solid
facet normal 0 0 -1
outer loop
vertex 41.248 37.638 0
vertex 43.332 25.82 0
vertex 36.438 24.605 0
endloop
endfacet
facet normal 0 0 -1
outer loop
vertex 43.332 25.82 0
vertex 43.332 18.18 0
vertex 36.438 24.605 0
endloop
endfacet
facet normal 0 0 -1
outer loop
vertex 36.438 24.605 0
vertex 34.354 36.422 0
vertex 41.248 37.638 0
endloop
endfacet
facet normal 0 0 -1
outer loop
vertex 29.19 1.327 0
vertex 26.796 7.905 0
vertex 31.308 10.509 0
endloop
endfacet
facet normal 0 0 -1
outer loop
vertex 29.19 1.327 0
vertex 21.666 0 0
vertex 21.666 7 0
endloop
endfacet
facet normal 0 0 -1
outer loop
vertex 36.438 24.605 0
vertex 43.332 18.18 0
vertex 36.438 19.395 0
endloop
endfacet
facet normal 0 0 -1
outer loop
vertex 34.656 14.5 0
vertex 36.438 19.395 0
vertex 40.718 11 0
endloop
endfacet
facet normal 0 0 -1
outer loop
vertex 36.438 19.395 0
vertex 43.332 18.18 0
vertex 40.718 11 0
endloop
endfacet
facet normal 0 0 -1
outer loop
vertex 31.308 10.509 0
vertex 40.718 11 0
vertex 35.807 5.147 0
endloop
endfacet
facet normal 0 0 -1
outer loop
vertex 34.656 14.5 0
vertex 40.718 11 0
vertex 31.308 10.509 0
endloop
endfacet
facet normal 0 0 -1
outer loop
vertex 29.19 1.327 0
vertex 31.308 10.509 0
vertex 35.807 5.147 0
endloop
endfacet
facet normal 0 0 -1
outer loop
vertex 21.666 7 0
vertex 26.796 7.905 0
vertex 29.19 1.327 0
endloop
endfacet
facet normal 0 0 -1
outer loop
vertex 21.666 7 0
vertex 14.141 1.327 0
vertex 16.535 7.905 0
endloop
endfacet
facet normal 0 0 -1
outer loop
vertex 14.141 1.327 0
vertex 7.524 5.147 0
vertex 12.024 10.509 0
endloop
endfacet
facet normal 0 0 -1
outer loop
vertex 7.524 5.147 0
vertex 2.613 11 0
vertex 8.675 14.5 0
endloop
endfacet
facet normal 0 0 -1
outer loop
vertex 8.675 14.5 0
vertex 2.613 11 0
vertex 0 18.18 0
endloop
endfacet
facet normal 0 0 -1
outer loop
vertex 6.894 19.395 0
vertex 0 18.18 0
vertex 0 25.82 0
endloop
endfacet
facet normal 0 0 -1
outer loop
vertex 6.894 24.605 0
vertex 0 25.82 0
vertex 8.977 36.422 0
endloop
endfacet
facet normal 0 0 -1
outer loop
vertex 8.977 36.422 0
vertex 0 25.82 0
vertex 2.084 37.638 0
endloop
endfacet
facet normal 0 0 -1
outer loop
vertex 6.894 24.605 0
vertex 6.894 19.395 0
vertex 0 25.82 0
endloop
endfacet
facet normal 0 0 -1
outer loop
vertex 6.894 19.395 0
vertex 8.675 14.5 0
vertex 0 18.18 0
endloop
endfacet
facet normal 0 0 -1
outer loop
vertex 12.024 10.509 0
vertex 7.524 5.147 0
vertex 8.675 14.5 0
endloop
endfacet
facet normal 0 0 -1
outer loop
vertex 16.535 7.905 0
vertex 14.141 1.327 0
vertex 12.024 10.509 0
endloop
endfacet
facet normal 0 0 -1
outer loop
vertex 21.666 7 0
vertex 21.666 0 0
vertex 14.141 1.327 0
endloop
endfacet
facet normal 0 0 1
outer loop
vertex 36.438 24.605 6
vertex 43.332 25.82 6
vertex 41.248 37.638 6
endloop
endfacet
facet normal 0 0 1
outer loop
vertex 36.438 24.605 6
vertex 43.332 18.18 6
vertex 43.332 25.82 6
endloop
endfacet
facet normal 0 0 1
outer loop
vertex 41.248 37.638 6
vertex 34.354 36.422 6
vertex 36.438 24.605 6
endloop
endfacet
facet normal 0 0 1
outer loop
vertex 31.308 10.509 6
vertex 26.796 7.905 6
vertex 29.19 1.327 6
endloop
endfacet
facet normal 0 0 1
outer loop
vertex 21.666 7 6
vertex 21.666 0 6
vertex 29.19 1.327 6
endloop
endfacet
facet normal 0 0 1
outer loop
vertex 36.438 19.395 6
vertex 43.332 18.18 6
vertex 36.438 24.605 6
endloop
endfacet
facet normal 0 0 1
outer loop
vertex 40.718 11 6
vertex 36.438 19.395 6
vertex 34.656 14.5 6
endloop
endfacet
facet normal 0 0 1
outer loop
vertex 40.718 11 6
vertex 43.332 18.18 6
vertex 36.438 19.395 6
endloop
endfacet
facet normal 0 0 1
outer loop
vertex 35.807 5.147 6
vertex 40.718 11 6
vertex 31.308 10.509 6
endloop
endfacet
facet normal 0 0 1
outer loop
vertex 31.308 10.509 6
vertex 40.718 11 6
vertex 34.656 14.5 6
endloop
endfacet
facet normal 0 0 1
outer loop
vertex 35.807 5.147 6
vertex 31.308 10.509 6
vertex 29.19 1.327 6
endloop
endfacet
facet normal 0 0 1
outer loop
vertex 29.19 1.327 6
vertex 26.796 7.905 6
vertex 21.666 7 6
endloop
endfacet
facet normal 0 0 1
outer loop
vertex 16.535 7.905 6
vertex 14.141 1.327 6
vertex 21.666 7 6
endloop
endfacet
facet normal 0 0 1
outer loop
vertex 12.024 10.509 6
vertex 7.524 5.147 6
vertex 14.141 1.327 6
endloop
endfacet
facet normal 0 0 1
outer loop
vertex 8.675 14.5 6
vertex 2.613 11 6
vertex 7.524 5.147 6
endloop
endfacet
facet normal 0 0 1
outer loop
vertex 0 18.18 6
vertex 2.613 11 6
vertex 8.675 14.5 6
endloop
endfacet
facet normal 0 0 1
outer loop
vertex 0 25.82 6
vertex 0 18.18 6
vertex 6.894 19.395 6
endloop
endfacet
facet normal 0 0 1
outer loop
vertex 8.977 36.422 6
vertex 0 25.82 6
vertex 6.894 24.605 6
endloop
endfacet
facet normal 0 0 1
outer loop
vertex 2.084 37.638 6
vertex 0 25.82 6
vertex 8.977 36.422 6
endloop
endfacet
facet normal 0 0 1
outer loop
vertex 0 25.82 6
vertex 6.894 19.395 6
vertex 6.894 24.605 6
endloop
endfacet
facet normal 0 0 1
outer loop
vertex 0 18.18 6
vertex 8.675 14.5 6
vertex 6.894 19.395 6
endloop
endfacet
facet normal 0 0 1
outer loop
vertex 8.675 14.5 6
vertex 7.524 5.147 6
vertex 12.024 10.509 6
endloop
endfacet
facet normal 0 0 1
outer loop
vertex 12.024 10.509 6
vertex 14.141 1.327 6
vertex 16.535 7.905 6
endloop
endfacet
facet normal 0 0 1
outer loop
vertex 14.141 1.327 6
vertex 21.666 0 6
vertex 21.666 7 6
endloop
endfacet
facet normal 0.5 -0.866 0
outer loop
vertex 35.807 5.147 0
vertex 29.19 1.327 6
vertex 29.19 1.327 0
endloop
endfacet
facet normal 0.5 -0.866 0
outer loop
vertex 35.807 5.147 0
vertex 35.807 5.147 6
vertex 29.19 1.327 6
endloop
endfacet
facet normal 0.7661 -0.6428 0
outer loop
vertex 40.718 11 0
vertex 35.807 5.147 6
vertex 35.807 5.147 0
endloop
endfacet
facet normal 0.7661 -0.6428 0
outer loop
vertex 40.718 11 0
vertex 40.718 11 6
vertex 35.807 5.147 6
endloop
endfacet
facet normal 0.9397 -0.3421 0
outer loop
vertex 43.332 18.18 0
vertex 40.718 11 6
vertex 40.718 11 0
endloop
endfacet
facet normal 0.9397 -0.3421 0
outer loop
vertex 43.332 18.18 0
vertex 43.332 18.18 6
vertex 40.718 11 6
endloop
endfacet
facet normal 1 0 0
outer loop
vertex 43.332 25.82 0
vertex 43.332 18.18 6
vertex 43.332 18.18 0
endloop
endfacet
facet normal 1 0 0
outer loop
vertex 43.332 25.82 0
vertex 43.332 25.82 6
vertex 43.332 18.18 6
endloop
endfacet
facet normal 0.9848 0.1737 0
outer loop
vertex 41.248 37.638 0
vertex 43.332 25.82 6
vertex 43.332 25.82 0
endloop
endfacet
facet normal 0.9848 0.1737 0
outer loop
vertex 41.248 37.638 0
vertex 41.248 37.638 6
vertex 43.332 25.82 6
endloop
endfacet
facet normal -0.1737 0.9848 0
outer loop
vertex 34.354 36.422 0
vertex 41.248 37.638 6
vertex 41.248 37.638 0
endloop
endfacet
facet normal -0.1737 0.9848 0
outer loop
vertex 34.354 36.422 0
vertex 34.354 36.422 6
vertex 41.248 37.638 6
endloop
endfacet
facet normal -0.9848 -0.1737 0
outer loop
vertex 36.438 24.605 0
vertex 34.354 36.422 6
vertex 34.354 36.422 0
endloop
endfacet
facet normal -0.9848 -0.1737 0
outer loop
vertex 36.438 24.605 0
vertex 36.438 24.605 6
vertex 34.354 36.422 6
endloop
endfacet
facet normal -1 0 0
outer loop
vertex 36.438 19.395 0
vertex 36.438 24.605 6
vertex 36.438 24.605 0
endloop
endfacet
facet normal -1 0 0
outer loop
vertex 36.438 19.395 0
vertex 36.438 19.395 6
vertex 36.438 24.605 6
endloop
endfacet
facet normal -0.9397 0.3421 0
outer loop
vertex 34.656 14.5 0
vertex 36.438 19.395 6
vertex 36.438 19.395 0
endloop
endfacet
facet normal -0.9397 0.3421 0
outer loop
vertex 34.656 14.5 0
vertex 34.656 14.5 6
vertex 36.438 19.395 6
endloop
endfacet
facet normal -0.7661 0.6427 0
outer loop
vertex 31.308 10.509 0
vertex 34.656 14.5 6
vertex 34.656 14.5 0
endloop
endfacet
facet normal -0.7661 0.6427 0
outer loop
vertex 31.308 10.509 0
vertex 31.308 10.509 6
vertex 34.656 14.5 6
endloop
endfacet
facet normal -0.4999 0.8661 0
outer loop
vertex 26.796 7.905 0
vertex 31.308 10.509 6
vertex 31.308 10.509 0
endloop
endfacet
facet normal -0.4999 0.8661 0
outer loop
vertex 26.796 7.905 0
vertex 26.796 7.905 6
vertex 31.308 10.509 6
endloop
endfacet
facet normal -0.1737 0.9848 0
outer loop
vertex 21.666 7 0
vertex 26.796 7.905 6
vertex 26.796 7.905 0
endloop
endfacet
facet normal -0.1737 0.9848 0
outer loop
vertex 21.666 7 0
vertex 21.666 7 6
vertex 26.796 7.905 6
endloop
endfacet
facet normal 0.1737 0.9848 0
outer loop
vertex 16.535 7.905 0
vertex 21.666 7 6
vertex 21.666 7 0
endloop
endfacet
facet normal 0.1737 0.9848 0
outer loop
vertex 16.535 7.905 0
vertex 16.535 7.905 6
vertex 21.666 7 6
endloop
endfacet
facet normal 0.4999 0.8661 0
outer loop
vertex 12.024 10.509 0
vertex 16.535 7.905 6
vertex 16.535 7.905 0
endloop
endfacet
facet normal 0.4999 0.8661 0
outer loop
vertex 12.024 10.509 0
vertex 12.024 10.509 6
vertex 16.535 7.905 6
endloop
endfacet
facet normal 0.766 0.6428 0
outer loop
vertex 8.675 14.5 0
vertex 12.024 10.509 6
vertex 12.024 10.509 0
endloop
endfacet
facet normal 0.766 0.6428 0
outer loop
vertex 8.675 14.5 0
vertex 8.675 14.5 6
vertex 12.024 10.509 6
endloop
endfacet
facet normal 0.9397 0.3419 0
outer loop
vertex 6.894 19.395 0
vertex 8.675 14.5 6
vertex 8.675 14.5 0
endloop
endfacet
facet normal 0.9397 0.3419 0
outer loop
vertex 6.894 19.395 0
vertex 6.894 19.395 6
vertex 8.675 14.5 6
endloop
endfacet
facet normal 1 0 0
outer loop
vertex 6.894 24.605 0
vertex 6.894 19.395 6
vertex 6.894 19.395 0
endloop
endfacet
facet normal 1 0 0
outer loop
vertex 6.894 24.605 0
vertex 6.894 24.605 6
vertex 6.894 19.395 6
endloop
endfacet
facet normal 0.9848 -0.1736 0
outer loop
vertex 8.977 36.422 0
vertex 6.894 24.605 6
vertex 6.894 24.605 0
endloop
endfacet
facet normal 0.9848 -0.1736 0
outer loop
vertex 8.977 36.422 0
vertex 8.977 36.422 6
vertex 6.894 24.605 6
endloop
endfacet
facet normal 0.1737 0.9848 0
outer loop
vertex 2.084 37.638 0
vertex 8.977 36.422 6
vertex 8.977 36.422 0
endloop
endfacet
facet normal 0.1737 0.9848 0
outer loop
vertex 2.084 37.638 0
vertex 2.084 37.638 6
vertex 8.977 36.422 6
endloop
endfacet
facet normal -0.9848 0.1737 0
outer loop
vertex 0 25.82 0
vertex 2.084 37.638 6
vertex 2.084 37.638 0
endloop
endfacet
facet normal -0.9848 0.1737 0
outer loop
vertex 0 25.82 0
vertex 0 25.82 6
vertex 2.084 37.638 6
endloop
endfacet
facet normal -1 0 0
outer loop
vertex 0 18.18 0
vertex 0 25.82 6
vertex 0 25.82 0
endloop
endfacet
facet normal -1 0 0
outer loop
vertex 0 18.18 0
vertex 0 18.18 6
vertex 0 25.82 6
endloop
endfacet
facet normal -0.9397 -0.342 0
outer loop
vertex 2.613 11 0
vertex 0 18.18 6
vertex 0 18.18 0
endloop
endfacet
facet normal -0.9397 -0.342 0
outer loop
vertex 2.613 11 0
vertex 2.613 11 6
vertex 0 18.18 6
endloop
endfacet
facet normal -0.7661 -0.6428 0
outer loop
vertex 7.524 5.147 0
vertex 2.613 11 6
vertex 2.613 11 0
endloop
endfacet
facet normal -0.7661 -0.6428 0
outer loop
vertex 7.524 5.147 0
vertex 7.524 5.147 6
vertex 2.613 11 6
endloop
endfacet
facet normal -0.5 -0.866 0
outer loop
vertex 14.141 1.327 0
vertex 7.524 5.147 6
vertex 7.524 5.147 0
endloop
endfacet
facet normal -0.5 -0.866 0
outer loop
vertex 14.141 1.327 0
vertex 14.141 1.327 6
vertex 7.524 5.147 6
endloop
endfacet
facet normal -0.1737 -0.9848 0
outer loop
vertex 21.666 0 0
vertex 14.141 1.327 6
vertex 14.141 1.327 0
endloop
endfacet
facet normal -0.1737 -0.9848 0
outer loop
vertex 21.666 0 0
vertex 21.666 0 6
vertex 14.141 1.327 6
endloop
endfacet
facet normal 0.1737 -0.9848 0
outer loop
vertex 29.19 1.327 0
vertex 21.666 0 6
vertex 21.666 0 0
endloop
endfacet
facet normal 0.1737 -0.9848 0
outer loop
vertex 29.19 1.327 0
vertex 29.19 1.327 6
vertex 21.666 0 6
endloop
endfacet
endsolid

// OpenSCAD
$fn = 32;

// ----------------------------------------------------------------------
// Clip blank: omega clip, 6 mm thick
// ----------------------------------------------------------------------

// --- parameters (mm) ---
profile_height = 6;       // extrusion height
profile_points = 26;      // points of the closed outline

profile = [[0, 25.82], [0, 18.18], [2.613, 11], [7.524, 5.147], [14.141, 1.327], [21.666, 0], [29.19, 1.327], [35.807, 5.147], [40.718, 11], [43.332, 18.18], [43.332, 25.82], [41.248, 37.638], [34.354, 36.422], [36.438, 24.605], [36.438, 19.395], [34.656, 14.5], [31.308, 10.509], [26.796, 7.905], [21.666, 7], [16.535, 7.905], [12.024, 10.509], [8.675, 14.5], [6.894, 19.395], [6.894, 24.605], [8.977, 36.422], [2.084, 37.638]];  // single closed polygon, 26 points, counter clockwise

// --- the one profile operation ---
linear_extrude(height = profile_height) polygon(points = profile);
